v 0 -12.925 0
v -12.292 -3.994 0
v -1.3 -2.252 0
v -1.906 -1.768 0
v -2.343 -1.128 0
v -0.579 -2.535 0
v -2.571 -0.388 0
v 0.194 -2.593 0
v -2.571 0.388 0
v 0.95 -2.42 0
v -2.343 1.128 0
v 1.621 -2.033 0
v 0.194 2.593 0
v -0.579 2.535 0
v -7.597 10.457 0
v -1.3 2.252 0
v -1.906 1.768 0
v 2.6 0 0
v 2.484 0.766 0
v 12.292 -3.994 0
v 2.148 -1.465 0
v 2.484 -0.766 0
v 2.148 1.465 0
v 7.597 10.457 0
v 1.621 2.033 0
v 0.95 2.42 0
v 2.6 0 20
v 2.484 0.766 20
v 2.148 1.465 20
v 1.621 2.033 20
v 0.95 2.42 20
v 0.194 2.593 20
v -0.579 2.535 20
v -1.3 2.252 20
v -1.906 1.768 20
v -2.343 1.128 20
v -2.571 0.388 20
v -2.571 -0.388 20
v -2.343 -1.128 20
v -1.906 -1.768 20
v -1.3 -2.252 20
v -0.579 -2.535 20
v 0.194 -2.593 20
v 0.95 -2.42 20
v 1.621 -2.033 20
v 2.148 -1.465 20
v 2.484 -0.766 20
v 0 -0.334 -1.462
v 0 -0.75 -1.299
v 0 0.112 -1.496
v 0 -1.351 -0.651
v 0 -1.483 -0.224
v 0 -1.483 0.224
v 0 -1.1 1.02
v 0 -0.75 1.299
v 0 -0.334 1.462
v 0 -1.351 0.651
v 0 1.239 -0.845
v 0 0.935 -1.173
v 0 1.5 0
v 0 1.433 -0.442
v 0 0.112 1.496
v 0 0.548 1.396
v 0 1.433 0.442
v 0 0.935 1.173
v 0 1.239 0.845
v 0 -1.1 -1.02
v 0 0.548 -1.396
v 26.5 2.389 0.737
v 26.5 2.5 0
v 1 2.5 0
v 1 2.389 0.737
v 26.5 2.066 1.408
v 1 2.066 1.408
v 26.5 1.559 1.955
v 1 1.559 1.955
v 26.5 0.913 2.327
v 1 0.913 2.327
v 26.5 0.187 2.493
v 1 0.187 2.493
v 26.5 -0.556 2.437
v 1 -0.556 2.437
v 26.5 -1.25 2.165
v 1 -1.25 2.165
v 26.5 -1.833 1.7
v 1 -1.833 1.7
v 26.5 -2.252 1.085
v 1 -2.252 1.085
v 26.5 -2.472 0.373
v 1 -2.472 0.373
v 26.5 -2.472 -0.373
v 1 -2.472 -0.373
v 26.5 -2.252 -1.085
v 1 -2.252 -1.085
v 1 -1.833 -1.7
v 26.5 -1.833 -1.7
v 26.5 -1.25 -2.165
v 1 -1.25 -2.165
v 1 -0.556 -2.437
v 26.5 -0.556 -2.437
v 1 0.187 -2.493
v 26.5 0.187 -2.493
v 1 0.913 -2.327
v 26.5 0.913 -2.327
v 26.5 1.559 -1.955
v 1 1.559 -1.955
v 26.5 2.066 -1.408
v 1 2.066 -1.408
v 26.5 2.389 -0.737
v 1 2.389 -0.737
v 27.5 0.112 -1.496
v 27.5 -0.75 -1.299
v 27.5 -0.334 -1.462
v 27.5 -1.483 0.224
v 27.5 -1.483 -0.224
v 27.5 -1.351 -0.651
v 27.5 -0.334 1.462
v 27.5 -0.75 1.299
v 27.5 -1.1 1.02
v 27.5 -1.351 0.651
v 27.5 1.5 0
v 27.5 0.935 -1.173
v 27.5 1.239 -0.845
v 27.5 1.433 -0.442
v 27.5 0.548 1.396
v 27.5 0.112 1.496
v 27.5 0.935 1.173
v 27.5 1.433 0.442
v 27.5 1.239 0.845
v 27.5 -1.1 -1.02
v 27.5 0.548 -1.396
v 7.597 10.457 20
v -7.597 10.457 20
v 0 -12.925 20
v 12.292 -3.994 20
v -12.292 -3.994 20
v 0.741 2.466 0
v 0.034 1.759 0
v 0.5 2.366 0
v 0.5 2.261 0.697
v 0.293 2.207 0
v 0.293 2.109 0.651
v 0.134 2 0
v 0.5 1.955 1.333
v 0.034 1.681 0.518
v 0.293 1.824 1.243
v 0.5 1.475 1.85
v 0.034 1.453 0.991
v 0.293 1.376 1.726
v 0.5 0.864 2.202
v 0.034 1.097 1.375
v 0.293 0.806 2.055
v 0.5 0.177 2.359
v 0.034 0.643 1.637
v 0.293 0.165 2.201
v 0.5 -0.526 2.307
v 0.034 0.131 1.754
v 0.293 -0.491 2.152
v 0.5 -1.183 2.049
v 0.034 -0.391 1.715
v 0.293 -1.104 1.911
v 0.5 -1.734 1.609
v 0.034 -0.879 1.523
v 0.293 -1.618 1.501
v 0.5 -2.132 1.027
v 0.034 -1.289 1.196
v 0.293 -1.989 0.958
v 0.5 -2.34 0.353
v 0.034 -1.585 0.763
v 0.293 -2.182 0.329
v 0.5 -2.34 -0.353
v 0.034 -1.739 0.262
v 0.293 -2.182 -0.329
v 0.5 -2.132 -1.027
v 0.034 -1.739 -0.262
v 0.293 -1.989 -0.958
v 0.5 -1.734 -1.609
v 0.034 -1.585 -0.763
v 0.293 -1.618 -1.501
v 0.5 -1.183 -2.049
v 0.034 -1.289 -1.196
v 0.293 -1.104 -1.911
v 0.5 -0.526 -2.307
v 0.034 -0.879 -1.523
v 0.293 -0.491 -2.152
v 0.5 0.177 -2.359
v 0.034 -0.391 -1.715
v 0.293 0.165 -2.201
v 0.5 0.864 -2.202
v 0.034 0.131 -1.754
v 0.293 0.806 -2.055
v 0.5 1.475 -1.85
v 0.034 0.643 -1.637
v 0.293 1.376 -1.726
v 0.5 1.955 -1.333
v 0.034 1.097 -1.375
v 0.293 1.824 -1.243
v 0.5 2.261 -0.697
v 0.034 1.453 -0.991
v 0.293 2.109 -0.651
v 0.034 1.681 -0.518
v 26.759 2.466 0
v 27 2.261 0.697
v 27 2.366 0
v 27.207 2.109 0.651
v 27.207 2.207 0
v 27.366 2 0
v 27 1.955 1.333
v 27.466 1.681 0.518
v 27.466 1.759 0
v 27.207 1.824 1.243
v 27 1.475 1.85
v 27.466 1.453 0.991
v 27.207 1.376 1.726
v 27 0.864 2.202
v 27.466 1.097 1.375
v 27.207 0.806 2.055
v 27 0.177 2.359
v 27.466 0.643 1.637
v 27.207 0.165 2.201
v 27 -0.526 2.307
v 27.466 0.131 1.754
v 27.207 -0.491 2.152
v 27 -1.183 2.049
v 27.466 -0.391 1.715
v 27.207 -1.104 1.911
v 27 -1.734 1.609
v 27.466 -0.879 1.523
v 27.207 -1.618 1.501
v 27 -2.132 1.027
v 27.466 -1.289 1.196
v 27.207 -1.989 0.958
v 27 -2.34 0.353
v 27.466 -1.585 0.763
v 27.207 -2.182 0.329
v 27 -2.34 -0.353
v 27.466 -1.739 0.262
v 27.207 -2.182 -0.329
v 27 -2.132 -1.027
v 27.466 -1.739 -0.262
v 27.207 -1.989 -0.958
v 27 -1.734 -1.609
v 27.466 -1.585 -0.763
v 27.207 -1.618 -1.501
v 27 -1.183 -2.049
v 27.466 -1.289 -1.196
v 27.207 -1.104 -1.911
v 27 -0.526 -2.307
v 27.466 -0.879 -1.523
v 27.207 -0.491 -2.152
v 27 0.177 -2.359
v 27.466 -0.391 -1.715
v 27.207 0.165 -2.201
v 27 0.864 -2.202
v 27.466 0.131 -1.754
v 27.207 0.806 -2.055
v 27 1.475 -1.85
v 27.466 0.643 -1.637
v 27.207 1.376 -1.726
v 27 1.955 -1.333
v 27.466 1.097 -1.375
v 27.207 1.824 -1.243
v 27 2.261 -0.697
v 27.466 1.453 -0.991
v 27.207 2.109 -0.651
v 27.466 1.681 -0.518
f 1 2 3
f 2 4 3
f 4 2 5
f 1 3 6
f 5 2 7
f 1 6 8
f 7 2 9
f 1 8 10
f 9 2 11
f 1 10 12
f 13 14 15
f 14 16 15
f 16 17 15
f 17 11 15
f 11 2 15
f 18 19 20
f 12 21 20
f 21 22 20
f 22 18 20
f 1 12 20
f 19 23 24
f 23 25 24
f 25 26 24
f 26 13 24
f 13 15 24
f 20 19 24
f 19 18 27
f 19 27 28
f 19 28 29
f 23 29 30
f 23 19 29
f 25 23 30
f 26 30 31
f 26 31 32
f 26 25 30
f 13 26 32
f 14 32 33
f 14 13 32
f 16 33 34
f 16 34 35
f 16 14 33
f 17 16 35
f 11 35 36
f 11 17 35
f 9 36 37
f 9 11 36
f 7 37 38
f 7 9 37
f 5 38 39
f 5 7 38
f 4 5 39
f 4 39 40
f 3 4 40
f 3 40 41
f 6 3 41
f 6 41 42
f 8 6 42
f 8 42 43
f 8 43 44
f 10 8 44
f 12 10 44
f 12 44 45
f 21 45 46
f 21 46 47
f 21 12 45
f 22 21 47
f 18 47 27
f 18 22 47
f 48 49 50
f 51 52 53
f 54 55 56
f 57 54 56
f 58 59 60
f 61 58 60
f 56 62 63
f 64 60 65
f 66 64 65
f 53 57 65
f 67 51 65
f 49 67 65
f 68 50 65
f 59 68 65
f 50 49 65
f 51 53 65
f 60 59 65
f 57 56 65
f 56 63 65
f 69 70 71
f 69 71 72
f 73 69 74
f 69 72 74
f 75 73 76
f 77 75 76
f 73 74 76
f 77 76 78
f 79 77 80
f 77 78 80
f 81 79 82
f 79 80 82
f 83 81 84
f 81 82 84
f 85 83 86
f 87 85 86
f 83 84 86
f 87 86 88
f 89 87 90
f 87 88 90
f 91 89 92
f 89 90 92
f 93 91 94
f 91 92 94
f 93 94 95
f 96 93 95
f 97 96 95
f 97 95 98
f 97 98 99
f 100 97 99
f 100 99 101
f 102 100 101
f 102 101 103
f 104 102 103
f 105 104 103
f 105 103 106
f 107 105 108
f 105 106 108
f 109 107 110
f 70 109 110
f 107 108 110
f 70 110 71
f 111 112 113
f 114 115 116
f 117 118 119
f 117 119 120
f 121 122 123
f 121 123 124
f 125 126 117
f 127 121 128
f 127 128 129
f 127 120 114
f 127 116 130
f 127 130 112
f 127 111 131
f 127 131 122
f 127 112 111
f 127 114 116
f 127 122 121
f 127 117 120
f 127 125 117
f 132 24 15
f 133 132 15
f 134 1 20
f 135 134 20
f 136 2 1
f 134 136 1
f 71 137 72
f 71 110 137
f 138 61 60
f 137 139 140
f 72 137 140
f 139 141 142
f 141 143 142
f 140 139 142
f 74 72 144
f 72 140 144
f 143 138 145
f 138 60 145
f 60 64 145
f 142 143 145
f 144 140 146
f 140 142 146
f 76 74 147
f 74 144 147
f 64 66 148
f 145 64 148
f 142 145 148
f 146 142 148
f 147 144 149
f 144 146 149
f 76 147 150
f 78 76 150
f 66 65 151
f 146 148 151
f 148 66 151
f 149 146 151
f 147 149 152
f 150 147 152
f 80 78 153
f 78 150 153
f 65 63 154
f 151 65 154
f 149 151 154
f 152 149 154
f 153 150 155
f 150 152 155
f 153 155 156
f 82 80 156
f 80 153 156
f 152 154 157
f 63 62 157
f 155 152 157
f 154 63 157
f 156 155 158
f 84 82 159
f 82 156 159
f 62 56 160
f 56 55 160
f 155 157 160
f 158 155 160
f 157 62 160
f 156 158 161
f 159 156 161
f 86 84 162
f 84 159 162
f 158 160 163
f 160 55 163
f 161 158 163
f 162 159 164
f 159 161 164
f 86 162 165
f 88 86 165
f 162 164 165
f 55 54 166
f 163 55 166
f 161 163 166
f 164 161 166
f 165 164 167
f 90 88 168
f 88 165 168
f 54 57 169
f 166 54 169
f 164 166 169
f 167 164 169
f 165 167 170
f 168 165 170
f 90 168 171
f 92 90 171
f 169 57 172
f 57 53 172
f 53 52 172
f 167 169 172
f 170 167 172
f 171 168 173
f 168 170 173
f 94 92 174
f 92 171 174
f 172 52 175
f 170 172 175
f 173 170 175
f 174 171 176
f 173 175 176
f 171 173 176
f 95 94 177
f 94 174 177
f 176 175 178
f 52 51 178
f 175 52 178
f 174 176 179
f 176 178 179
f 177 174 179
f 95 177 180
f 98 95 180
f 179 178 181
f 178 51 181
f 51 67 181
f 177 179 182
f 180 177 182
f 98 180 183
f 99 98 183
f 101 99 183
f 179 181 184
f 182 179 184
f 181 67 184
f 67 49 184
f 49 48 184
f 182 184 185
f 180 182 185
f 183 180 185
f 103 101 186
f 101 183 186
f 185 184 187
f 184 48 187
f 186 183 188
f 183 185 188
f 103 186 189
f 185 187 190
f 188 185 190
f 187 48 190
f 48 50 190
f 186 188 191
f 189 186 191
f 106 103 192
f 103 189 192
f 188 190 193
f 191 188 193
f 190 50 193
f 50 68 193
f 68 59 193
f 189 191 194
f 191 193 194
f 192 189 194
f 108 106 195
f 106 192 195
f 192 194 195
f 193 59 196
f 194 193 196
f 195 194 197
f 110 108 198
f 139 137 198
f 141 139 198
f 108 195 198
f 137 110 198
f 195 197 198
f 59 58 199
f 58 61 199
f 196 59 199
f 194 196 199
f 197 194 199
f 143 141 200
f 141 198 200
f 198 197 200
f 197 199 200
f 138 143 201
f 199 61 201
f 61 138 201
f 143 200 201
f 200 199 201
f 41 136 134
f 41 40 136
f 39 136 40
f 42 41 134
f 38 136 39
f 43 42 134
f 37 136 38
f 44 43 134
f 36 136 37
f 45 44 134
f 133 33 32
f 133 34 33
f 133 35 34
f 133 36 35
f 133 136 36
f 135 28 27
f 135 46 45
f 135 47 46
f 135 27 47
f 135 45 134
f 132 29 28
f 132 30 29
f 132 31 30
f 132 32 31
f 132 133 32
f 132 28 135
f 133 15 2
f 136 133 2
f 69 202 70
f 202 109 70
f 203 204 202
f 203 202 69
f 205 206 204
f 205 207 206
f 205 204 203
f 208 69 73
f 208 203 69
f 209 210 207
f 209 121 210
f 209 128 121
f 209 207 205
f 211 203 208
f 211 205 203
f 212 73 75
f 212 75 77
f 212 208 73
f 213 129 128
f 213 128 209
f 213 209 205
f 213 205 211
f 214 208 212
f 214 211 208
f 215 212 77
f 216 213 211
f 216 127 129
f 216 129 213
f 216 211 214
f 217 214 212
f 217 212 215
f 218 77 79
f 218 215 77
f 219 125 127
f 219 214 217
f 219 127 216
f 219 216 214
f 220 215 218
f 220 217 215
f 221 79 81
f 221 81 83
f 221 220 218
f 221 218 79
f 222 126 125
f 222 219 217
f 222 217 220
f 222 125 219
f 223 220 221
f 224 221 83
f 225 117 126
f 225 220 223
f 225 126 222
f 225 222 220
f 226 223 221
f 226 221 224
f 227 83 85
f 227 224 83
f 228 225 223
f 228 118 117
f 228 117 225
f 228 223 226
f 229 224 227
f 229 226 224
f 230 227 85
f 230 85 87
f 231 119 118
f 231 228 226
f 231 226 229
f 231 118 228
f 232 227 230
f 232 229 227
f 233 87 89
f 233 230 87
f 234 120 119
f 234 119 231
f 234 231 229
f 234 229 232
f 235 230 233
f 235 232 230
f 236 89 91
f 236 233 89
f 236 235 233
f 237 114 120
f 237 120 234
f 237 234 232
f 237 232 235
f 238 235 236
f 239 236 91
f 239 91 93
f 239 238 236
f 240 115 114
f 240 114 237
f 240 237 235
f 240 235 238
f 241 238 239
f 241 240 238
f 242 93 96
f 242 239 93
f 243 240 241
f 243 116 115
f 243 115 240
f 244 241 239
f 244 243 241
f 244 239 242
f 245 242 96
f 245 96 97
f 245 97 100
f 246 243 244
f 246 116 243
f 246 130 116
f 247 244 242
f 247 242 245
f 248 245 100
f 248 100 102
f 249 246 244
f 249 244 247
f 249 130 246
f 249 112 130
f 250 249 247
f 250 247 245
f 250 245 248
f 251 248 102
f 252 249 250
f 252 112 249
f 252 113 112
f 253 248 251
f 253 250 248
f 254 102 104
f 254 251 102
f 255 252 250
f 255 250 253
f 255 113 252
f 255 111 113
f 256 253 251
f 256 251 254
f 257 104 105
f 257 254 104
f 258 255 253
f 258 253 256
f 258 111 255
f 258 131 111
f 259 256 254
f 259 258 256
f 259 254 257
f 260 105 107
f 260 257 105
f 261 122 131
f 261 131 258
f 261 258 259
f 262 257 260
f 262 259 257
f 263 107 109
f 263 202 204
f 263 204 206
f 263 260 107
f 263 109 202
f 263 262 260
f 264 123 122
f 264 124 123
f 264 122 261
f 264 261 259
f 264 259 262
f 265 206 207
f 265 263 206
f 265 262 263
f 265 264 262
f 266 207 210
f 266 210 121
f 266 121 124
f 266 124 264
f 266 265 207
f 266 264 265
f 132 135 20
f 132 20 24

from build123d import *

# Parameters (mm, degrees)
F0_R     = 2.5
F1_DEPTH = 27.5
F2_R     = 1
F3_R     = 2.6
F4_DEPTH = 20


with BuildPart() as f1:
    # F0 (on Right) → F1 (new body)
    with BuildSketch(Plane.YZ):
        Circle(F0_R)
    extrude(amount=F1_DEPTH)

    # F2
    f2_edges = [f1.edges().sort_by_distance(p)[0] for p in [
        (27.5, -2.5, 0),
        (0, -2.5, 0),
    ]]
    fillet(f2_edges, radius=F2_R)


with BuildPart() as f4:
    # F3 (on Top) → F4 (new body)
    with BuildSketch(Plane.XY):
        Polygon((-12.292405, -3.994045), (0, -12.925), (12.292405, -3.994045), (7.597124, 10.456545), (-7.597124, 10.456545), align=None)
        Circle(F3_R, mode=Mode.SUBTRACT)
    extrude(amount=F4_DEPTH)


solid = Compound([f1.part, f4.part])
